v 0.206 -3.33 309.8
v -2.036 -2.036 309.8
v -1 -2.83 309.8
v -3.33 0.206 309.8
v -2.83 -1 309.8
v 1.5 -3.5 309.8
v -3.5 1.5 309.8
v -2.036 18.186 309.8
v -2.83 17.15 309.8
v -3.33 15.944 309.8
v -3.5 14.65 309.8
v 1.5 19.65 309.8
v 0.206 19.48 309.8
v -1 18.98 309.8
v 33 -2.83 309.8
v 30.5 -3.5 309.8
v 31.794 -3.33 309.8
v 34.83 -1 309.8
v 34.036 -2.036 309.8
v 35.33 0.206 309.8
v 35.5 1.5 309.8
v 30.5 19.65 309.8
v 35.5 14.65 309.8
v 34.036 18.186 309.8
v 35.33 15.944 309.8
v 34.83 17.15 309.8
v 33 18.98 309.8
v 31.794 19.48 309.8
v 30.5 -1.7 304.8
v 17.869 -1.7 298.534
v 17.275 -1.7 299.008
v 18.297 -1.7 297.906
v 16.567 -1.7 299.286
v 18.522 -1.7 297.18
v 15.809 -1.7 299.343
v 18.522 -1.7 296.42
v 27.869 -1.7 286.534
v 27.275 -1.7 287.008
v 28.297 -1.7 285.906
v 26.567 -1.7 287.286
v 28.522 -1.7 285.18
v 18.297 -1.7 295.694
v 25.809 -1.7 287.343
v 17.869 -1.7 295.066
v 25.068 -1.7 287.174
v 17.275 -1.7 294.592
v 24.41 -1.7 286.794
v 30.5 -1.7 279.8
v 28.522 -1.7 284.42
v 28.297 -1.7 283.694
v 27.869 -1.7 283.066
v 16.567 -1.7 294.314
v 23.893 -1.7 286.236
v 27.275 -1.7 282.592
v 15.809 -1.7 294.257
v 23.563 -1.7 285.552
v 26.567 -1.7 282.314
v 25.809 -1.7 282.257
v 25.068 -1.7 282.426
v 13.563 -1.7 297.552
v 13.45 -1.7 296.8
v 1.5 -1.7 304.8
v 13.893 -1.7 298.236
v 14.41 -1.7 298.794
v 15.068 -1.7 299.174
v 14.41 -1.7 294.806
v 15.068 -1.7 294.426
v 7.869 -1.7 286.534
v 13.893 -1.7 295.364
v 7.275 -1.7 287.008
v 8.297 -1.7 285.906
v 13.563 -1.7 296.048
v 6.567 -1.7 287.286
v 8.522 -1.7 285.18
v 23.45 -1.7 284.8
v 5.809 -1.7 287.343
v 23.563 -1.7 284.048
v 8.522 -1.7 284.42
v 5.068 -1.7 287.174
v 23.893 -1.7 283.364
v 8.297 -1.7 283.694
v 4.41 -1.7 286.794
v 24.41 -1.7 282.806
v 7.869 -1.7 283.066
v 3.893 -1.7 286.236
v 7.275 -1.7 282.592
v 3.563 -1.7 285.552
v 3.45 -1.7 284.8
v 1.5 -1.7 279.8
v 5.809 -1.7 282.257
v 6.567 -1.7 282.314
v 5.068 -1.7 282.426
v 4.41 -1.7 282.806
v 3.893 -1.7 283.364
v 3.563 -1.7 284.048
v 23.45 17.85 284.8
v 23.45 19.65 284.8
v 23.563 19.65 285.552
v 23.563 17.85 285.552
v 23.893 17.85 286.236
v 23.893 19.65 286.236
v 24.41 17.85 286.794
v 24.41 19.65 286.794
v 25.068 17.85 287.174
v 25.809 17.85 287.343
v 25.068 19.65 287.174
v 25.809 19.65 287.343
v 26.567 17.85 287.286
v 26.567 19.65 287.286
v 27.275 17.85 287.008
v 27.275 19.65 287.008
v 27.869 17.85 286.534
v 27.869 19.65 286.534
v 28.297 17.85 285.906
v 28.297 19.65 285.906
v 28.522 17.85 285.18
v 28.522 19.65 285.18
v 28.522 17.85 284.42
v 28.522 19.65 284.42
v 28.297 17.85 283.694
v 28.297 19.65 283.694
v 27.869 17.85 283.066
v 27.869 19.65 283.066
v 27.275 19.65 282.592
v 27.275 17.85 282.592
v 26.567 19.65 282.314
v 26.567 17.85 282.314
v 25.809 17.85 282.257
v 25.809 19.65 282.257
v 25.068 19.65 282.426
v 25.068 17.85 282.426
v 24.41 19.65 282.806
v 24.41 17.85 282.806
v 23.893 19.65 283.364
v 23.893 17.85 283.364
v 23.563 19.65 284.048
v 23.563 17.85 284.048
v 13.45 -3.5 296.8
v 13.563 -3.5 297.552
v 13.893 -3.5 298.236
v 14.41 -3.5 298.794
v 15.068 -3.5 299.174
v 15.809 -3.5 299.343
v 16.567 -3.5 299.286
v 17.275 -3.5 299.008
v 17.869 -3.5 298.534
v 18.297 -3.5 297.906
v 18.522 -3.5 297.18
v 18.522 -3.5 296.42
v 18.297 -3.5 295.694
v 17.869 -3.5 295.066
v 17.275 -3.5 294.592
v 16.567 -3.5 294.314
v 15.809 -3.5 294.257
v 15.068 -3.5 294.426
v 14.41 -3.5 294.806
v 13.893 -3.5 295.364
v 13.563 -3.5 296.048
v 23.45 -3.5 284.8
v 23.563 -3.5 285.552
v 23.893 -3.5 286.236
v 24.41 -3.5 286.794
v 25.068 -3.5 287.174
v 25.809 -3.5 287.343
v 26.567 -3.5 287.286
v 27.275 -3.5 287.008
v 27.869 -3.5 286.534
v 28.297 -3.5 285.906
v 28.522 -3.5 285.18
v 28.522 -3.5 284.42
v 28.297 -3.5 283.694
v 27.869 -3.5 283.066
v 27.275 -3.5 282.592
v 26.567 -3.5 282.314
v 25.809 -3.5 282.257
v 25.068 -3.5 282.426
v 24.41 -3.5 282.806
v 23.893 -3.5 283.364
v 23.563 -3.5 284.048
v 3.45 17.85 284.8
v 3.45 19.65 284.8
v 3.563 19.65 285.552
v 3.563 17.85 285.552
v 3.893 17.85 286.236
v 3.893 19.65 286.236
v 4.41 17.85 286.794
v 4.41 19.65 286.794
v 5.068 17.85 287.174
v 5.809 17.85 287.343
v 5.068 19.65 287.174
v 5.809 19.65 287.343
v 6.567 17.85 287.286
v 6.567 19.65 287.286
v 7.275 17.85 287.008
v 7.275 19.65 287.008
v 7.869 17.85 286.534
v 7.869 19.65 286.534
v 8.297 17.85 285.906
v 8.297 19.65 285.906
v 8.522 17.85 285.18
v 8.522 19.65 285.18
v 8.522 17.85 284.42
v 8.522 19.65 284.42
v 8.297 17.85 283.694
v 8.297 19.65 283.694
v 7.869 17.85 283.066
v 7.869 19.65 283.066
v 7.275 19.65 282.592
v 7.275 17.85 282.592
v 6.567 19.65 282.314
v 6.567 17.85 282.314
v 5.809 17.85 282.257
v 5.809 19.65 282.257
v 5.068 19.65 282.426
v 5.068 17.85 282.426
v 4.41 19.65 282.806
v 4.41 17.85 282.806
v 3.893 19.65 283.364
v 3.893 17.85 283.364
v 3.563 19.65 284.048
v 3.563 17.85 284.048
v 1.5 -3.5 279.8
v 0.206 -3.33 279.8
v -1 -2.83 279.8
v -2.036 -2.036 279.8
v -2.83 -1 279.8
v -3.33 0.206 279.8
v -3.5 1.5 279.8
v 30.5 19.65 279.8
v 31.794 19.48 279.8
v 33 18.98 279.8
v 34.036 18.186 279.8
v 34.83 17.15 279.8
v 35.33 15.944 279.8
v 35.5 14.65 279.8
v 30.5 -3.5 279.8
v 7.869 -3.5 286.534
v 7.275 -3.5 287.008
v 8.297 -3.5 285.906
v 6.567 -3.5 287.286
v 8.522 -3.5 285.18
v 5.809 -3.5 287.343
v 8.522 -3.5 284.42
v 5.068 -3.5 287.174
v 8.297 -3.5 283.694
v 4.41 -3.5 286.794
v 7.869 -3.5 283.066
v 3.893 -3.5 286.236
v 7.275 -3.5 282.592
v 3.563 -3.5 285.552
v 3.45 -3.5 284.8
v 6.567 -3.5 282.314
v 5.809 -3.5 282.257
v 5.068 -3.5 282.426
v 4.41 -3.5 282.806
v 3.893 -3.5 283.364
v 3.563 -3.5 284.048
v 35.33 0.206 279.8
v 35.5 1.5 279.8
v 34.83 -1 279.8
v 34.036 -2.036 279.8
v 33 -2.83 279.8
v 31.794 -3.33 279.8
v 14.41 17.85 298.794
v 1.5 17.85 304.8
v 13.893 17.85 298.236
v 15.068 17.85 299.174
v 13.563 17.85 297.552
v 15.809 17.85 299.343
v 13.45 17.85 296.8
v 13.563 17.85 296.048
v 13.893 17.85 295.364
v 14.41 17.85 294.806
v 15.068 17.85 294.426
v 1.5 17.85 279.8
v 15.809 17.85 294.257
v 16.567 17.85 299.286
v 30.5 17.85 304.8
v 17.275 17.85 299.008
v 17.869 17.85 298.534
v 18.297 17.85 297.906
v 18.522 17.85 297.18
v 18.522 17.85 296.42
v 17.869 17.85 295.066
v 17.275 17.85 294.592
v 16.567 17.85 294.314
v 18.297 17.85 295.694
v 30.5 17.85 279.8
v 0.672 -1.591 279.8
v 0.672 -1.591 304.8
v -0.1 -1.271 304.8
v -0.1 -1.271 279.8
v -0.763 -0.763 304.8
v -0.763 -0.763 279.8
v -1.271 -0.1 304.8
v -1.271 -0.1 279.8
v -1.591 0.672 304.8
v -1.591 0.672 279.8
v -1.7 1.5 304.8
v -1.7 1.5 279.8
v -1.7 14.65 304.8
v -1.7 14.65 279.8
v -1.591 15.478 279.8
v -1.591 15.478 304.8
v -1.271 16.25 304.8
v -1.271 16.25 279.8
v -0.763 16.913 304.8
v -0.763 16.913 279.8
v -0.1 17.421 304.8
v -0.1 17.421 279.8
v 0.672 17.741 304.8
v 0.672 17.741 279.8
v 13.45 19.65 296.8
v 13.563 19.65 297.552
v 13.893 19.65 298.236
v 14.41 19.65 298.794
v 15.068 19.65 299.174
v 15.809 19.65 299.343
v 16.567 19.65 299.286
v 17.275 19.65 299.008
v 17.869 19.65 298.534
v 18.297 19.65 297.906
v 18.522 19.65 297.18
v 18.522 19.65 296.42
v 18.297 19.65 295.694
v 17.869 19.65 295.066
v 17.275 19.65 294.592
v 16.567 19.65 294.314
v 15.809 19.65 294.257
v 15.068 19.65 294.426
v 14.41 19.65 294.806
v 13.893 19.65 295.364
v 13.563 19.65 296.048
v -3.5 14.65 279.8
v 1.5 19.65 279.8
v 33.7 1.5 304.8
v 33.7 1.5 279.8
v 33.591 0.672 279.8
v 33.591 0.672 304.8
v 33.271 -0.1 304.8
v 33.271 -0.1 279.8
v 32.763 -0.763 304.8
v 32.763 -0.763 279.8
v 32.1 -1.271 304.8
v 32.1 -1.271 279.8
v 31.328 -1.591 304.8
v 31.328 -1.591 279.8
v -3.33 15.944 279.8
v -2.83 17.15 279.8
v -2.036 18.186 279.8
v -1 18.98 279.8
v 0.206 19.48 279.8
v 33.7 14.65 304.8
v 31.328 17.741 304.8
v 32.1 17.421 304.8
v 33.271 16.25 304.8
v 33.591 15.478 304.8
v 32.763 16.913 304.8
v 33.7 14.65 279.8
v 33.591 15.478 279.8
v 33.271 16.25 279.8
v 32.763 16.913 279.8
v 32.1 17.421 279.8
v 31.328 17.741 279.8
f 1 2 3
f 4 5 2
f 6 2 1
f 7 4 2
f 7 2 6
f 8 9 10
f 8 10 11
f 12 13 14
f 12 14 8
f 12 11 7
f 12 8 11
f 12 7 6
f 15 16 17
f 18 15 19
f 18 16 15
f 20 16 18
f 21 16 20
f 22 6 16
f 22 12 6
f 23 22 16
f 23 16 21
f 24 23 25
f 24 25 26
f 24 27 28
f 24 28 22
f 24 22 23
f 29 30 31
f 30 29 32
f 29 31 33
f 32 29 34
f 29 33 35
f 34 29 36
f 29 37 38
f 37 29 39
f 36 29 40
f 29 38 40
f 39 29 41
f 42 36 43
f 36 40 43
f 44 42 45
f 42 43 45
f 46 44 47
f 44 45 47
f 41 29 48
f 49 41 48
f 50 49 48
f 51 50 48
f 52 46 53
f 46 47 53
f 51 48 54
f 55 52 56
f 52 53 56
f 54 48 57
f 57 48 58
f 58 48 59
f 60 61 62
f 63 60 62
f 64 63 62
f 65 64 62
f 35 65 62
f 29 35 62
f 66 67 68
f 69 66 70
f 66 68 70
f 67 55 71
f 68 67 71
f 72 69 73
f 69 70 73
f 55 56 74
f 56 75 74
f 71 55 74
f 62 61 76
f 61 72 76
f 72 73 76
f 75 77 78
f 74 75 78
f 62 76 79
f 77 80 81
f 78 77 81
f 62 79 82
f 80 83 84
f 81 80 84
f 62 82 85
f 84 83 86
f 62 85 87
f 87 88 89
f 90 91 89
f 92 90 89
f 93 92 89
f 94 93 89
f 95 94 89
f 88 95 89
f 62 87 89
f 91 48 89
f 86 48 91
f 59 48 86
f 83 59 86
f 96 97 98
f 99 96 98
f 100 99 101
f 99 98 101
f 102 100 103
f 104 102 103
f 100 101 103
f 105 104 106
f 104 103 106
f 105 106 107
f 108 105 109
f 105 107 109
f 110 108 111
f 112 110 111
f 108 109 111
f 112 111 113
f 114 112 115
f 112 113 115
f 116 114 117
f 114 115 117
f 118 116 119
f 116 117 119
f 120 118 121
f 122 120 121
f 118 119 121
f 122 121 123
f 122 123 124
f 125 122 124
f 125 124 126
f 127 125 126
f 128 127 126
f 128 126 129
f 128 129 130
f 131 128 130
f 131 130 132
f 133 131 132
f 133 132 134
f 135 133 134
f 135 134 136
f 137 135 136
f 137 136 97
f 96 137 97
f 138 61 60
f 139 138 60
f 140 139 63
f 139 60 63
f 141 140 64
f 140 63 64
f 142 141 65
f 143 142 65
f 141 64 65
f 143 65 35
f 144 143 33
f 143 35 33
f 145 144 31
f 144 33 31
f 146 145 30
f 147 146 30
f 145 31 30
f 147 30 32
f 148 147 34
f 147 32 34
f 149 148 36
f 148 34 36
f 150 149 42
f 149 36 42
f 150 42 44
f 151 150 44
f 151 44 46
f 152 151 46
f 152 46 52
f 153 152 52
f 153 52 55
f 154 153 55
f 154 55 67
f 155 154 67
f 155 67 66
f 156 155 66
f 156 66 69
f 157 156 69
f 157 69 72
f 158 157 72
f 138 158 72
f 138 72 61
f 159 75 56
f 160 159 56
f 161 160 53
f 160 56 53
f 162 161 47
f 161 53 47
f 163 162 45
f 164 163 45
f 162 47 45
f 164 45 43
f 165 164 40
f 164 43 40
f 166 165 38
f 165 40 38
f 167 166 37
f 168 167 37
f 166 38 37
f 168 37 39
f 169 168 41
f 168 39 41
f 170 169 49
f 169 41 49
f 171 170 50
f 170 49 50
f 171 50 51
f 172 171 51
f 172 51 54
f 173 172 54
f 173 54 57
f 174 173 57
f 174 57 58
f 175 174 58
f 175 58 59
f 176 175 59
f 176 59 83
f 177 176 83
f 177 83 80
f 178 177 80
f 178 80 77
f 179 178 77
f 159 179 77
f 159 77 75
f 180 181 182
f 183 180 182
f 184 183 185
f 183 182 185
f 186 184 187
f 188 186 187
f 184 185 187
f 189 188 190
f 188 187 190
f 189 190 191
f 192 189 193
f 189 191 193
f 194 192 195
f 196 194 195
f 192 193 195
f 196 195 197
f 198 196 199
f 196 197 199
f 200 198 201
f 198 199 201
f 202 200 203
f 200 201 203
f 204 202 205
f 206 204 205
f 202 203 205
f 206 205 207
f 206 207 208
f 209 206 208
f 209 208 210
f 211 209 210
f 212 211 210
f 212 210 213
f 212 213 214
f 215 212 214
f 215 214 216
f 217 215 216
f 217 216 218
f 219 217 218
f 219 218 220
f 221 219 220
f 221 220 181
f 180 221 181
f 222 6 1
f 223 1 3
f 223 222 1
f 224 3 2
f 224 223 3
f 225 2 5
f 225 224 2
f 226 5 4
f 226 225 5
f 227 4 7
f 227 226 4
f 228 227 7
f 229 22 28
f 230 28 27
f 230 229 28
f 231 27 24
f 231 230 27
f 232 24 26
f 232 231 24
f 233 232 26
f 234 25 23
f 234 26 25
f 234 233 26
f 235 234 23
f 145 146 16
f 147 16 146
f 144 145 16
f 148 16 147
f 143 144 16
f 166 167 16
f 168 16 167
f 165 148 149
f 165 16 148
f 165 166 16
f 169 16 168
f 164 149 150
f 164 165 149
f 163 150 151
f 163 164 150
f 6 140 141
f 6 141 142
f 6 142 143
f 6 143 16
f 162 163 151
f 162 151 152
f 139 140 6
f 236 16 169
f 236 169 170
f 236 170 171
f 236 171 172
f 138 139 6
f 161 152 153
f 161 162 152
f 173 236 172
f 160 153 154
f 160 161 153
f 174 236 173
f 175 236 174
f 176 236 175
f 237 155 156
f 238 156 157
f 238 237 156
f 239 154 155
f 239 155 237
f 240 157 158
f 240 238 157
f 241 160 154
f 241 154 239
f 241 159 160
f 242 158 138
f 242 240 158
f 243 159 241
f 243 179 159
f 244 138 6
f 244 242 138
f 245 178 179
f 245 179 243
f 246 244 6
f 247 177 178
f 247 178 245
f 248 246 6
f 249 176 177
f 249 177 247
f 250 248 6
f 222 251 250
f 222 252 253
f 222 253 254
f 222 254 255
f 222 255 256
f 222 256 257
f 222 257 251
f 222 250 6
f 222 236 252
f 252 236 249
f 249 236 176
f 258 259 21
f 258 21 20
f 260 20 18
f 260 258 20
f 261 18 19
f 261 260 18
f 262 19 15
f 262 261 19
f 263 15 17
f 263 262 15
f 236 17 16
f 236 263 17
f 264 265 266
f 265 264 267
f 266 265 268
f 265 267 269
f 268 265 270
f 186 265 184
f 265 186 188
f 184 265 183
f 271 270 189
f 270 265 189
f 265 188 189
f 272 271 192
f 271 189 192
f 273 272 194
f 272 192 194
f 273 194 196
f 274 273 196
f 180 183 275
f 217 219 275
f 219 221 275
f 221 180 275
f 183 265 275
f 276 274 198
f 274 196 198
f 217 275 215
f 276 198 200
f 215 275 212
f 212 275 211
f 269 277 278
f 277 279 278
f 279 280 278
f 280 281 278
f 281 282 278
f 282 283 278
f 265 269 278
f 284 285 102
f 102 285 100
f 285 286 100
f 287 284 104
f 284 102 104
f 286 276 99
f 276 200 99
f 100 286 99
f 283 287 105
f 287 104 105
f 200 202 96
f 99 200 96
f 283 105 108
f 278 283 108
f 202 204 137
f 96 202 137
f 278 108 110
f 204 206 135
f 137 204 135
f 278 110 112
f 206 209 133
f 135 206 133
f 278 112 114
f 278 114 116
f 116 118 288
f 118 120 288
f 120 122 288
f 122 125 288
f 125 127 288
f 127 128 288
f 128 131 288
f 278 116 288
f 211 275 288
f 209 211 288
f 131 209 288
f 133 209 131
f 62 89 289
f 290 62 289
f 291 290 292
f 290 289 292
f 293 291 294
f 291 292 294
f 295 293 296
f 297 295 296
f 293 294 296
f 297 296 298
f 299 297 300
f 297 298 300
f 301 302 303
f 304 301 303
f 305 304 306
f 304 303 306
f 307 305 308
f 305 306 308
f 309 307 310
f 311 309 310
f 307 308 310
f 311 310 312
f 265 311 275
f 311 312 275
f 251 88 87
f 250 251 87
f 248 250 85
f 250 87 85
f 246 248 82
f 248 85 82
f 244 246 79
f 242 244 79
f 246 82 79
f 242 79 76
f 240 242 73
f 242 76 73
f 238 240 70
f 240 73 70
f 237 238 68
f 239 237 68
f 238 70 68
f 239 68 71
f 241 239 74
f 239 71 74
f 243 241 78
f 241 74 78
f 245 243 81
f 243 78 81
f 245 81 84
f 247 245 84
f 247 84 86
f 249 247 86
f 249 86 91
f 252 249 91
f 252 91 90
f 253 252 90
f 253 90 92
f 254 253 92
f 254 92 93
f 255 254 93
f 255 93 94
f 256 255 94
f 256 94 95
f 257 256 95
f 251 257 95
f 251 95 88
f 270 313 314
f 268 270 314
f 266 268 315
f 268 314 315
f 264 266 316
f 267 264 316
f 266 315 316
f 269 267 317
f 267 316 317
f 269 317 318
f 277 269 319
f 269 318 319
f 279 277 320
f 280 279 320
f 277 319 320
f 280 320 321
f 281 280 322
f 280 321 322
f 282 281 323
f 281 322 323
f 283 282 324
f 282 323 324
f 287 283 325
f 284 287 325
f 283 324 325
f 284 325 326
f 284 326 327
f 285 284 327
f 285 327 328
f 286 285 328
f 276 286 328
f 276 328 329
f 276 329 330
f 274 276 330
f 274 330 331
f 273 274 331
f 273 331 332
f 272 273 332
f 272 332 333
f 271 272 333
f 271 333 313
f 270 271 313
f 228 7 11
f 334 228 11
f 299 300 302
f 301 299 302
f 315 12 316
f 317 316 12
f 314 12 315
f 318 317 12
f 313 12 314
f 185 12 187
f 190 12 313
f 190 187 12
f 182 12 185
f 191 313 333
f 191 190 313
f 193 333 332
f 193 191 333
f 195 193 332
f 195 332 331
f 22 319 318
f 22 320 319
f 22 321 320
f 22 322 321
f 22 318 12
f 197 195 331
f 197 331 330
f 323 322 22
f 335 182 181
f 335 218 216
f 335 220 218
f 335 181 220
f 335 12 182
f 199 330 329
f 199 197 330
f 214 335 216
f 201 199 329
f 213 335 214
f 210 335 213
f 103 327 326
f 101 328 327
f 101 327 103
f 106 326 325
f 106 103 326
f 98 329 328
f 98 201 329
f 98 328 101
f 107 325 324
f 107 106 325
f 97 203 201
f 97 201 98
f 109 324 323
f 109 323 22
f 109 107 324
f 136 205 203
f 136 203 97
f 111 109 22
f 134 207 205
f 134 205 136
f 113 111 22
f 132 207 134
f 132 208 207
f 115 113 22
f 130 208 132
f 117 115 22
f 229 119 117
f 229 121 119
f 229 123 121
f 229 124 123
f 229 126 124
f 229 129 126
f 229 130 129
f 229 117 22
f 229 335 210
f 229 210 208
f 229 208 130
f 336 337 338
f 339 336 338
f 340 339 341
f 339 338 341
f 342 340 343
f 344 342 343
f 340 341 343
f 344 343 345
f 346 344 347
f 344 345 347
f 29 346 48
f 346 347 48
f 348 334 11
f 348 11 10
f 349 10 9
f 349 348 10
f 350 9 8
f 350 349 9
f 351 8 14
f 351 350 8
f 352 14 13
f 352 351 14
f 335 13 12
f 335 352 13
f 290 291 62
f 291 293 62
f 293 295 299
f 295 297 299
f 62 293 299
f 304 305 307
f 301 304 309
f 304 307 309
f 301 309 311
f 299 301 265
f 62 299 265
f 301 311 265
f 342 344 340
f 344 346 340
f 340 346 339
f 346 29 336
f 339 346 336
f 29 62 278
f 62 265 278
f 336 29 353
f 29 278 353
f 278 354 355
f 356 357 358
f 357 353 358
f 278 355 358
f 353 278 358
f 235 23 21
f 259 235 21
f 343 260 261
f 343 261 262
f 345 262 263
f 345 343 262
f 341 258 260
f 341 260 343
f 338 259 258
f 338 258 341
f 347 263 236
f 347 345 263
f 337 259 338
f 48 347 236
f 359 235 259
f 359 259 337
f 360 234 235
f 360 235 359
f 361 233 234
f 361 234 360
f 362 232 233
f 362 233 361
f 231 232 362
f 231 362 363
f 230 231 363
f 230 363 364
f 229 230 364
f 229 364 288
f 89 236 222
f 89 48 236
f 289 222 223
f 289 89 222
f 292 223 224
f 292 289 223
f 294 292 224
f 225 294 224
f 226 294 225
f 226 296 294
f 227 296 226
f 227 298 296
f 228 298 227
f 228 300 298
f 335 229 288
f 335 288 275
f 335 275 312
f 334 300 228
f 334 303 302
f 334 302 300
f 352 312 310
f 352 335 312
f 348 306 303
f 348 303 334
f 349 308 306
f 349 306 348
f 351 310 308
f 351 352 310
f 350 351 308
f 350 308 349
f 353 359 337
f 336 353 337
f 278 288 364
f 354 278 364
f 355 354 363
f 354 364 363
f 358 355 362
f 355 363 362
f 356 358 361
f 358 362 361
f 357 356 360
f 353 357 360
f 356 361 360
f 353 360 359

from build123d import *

# Parameters (mm, degrees)
BOSS_EXTRUDE2_DEPTH = 5
BOSS_EXTRUDE3_START = 25
BOSS_EXTRUDE3_DEPTH = 25
SKETCH7_R           = 2.55
CUT_EXTRUDE1_DEPTH  = 313.685484953


with BuildPart() as part:
    # Sketch4 → Boss-Extrude2 (new body)
    with BuildSketch(Plane.XY.offset(304.8)):
        with BuildLine():
            Line((35.5, 1.5), (35.5, 14.65))
            ThreePointArc((35.5, 14.65), (34.035533906, 18.185533906), (30.5, 19.65))
            Line((30.5, 19.65), (1.5, 19.65))
            ThreePointArc((1.5, 19.65), (-2.035533906, 18.185533906), (-3.5, 14.65))
            Line((-3.5, 14.65), (-3.5, 1.5))
            ThreePointArc((-3.5, 1.5), (-2.035533906, -2.035533906), (1.5, -3.5))
            Line((1.5, -3.5), (30.5, -3.5))
            ThreePointArc((30.5, -3.5), (34.035533906, -2.035533906), (35.5, 1.5))
        make_face()
    extrude(amount=BOSS_EXTRUDE2_DEPTH)

    # Sketch6 → Boss-Extrude3 (add)
    with BuildSketch(Plane(origin=(0, 0, 304.8), x_dir=(-1, 0, 0), z_dir=(0, 0, -1)).offset(BOSS_EXTRUDE3_START)):
        with BuildLine():
            Line((-30.5, -3.5), (-1.5, -3.5))
            ThreePointArc((-1.5, -3.5), (2.035533906, -2.035533906), (3.5, 1.5))
            Line((3.5, 1.5), (3.5, 14.65))
            ThreePointArc((3.5, 14.65), (2.035533906, 18.185533906), (-1.5, 19.65))
            Line((-1.5, 19.65), (-30.5, 19.65))
            ThreePointArc((-30.5, 19.65), (-34.035533906, 18.185533906), (-35.5, 14.65))
            Line((-35.5, 14.65), (-35.5, 1.5))
            ThreePointArc((-35.5, 1.5), (-34.035533906, -2.035533906), (-30.5, -3.5))
        make_face()
        with BuildLine():
            Line((-1.5, 17.85), (-30.5, 17.85))
            ThreePointArc((-30.5, 17.85), (-32.7627417, 16.9127417), (-33.7, 14.65))
            Line((-33.7, 14.65), (-33.7, 1.5))
            ThreePointArc((-33.7, 1.5), (-32.7627417, -0.7627417), (-30.5, -1.7))
            Line((-30.5, -1.7), (-1.5, -1.7))
            ThreePointArc((-1.5, -1.7), (0.7627417, -0.7627417), (1.7, 1.5))
            Line((1.7, 1.5), (1.7, 14.65))
            ThreePointArc((1.7, 14.65), (0.7627417, 16.9127417), (-1.5, 17.85))
        make_face(mode=Mode.SUBTRACT)
    extrude(amount=-BOSS_EXTRUDE3_DEPTH)

    # Sketch7 → Cut-Extrude1 (cut, through all)
    with BuildSketch(Plane(origin=(0, 19.65, 0), x_dir=(1, 0, 0), z_dir=(0, 1, 0))):
        with Locations(Location((16, -296.8, 0), (0, 0, 180))):
            Circle(SKETCH7_R)
        with Locations(Location((26, -284.8, 0), (0, 0, 180))):
            Circle(SKETCH7_R)
        with Locations(Location((6, -284.8, 0), (0, 0, 180))):
            Circle(SKETCH7_R)
    extrude(amount=-CUT_EXTRUDE1_DEPTH, mode=Mode.SUBTRACT)


solid = part.part
